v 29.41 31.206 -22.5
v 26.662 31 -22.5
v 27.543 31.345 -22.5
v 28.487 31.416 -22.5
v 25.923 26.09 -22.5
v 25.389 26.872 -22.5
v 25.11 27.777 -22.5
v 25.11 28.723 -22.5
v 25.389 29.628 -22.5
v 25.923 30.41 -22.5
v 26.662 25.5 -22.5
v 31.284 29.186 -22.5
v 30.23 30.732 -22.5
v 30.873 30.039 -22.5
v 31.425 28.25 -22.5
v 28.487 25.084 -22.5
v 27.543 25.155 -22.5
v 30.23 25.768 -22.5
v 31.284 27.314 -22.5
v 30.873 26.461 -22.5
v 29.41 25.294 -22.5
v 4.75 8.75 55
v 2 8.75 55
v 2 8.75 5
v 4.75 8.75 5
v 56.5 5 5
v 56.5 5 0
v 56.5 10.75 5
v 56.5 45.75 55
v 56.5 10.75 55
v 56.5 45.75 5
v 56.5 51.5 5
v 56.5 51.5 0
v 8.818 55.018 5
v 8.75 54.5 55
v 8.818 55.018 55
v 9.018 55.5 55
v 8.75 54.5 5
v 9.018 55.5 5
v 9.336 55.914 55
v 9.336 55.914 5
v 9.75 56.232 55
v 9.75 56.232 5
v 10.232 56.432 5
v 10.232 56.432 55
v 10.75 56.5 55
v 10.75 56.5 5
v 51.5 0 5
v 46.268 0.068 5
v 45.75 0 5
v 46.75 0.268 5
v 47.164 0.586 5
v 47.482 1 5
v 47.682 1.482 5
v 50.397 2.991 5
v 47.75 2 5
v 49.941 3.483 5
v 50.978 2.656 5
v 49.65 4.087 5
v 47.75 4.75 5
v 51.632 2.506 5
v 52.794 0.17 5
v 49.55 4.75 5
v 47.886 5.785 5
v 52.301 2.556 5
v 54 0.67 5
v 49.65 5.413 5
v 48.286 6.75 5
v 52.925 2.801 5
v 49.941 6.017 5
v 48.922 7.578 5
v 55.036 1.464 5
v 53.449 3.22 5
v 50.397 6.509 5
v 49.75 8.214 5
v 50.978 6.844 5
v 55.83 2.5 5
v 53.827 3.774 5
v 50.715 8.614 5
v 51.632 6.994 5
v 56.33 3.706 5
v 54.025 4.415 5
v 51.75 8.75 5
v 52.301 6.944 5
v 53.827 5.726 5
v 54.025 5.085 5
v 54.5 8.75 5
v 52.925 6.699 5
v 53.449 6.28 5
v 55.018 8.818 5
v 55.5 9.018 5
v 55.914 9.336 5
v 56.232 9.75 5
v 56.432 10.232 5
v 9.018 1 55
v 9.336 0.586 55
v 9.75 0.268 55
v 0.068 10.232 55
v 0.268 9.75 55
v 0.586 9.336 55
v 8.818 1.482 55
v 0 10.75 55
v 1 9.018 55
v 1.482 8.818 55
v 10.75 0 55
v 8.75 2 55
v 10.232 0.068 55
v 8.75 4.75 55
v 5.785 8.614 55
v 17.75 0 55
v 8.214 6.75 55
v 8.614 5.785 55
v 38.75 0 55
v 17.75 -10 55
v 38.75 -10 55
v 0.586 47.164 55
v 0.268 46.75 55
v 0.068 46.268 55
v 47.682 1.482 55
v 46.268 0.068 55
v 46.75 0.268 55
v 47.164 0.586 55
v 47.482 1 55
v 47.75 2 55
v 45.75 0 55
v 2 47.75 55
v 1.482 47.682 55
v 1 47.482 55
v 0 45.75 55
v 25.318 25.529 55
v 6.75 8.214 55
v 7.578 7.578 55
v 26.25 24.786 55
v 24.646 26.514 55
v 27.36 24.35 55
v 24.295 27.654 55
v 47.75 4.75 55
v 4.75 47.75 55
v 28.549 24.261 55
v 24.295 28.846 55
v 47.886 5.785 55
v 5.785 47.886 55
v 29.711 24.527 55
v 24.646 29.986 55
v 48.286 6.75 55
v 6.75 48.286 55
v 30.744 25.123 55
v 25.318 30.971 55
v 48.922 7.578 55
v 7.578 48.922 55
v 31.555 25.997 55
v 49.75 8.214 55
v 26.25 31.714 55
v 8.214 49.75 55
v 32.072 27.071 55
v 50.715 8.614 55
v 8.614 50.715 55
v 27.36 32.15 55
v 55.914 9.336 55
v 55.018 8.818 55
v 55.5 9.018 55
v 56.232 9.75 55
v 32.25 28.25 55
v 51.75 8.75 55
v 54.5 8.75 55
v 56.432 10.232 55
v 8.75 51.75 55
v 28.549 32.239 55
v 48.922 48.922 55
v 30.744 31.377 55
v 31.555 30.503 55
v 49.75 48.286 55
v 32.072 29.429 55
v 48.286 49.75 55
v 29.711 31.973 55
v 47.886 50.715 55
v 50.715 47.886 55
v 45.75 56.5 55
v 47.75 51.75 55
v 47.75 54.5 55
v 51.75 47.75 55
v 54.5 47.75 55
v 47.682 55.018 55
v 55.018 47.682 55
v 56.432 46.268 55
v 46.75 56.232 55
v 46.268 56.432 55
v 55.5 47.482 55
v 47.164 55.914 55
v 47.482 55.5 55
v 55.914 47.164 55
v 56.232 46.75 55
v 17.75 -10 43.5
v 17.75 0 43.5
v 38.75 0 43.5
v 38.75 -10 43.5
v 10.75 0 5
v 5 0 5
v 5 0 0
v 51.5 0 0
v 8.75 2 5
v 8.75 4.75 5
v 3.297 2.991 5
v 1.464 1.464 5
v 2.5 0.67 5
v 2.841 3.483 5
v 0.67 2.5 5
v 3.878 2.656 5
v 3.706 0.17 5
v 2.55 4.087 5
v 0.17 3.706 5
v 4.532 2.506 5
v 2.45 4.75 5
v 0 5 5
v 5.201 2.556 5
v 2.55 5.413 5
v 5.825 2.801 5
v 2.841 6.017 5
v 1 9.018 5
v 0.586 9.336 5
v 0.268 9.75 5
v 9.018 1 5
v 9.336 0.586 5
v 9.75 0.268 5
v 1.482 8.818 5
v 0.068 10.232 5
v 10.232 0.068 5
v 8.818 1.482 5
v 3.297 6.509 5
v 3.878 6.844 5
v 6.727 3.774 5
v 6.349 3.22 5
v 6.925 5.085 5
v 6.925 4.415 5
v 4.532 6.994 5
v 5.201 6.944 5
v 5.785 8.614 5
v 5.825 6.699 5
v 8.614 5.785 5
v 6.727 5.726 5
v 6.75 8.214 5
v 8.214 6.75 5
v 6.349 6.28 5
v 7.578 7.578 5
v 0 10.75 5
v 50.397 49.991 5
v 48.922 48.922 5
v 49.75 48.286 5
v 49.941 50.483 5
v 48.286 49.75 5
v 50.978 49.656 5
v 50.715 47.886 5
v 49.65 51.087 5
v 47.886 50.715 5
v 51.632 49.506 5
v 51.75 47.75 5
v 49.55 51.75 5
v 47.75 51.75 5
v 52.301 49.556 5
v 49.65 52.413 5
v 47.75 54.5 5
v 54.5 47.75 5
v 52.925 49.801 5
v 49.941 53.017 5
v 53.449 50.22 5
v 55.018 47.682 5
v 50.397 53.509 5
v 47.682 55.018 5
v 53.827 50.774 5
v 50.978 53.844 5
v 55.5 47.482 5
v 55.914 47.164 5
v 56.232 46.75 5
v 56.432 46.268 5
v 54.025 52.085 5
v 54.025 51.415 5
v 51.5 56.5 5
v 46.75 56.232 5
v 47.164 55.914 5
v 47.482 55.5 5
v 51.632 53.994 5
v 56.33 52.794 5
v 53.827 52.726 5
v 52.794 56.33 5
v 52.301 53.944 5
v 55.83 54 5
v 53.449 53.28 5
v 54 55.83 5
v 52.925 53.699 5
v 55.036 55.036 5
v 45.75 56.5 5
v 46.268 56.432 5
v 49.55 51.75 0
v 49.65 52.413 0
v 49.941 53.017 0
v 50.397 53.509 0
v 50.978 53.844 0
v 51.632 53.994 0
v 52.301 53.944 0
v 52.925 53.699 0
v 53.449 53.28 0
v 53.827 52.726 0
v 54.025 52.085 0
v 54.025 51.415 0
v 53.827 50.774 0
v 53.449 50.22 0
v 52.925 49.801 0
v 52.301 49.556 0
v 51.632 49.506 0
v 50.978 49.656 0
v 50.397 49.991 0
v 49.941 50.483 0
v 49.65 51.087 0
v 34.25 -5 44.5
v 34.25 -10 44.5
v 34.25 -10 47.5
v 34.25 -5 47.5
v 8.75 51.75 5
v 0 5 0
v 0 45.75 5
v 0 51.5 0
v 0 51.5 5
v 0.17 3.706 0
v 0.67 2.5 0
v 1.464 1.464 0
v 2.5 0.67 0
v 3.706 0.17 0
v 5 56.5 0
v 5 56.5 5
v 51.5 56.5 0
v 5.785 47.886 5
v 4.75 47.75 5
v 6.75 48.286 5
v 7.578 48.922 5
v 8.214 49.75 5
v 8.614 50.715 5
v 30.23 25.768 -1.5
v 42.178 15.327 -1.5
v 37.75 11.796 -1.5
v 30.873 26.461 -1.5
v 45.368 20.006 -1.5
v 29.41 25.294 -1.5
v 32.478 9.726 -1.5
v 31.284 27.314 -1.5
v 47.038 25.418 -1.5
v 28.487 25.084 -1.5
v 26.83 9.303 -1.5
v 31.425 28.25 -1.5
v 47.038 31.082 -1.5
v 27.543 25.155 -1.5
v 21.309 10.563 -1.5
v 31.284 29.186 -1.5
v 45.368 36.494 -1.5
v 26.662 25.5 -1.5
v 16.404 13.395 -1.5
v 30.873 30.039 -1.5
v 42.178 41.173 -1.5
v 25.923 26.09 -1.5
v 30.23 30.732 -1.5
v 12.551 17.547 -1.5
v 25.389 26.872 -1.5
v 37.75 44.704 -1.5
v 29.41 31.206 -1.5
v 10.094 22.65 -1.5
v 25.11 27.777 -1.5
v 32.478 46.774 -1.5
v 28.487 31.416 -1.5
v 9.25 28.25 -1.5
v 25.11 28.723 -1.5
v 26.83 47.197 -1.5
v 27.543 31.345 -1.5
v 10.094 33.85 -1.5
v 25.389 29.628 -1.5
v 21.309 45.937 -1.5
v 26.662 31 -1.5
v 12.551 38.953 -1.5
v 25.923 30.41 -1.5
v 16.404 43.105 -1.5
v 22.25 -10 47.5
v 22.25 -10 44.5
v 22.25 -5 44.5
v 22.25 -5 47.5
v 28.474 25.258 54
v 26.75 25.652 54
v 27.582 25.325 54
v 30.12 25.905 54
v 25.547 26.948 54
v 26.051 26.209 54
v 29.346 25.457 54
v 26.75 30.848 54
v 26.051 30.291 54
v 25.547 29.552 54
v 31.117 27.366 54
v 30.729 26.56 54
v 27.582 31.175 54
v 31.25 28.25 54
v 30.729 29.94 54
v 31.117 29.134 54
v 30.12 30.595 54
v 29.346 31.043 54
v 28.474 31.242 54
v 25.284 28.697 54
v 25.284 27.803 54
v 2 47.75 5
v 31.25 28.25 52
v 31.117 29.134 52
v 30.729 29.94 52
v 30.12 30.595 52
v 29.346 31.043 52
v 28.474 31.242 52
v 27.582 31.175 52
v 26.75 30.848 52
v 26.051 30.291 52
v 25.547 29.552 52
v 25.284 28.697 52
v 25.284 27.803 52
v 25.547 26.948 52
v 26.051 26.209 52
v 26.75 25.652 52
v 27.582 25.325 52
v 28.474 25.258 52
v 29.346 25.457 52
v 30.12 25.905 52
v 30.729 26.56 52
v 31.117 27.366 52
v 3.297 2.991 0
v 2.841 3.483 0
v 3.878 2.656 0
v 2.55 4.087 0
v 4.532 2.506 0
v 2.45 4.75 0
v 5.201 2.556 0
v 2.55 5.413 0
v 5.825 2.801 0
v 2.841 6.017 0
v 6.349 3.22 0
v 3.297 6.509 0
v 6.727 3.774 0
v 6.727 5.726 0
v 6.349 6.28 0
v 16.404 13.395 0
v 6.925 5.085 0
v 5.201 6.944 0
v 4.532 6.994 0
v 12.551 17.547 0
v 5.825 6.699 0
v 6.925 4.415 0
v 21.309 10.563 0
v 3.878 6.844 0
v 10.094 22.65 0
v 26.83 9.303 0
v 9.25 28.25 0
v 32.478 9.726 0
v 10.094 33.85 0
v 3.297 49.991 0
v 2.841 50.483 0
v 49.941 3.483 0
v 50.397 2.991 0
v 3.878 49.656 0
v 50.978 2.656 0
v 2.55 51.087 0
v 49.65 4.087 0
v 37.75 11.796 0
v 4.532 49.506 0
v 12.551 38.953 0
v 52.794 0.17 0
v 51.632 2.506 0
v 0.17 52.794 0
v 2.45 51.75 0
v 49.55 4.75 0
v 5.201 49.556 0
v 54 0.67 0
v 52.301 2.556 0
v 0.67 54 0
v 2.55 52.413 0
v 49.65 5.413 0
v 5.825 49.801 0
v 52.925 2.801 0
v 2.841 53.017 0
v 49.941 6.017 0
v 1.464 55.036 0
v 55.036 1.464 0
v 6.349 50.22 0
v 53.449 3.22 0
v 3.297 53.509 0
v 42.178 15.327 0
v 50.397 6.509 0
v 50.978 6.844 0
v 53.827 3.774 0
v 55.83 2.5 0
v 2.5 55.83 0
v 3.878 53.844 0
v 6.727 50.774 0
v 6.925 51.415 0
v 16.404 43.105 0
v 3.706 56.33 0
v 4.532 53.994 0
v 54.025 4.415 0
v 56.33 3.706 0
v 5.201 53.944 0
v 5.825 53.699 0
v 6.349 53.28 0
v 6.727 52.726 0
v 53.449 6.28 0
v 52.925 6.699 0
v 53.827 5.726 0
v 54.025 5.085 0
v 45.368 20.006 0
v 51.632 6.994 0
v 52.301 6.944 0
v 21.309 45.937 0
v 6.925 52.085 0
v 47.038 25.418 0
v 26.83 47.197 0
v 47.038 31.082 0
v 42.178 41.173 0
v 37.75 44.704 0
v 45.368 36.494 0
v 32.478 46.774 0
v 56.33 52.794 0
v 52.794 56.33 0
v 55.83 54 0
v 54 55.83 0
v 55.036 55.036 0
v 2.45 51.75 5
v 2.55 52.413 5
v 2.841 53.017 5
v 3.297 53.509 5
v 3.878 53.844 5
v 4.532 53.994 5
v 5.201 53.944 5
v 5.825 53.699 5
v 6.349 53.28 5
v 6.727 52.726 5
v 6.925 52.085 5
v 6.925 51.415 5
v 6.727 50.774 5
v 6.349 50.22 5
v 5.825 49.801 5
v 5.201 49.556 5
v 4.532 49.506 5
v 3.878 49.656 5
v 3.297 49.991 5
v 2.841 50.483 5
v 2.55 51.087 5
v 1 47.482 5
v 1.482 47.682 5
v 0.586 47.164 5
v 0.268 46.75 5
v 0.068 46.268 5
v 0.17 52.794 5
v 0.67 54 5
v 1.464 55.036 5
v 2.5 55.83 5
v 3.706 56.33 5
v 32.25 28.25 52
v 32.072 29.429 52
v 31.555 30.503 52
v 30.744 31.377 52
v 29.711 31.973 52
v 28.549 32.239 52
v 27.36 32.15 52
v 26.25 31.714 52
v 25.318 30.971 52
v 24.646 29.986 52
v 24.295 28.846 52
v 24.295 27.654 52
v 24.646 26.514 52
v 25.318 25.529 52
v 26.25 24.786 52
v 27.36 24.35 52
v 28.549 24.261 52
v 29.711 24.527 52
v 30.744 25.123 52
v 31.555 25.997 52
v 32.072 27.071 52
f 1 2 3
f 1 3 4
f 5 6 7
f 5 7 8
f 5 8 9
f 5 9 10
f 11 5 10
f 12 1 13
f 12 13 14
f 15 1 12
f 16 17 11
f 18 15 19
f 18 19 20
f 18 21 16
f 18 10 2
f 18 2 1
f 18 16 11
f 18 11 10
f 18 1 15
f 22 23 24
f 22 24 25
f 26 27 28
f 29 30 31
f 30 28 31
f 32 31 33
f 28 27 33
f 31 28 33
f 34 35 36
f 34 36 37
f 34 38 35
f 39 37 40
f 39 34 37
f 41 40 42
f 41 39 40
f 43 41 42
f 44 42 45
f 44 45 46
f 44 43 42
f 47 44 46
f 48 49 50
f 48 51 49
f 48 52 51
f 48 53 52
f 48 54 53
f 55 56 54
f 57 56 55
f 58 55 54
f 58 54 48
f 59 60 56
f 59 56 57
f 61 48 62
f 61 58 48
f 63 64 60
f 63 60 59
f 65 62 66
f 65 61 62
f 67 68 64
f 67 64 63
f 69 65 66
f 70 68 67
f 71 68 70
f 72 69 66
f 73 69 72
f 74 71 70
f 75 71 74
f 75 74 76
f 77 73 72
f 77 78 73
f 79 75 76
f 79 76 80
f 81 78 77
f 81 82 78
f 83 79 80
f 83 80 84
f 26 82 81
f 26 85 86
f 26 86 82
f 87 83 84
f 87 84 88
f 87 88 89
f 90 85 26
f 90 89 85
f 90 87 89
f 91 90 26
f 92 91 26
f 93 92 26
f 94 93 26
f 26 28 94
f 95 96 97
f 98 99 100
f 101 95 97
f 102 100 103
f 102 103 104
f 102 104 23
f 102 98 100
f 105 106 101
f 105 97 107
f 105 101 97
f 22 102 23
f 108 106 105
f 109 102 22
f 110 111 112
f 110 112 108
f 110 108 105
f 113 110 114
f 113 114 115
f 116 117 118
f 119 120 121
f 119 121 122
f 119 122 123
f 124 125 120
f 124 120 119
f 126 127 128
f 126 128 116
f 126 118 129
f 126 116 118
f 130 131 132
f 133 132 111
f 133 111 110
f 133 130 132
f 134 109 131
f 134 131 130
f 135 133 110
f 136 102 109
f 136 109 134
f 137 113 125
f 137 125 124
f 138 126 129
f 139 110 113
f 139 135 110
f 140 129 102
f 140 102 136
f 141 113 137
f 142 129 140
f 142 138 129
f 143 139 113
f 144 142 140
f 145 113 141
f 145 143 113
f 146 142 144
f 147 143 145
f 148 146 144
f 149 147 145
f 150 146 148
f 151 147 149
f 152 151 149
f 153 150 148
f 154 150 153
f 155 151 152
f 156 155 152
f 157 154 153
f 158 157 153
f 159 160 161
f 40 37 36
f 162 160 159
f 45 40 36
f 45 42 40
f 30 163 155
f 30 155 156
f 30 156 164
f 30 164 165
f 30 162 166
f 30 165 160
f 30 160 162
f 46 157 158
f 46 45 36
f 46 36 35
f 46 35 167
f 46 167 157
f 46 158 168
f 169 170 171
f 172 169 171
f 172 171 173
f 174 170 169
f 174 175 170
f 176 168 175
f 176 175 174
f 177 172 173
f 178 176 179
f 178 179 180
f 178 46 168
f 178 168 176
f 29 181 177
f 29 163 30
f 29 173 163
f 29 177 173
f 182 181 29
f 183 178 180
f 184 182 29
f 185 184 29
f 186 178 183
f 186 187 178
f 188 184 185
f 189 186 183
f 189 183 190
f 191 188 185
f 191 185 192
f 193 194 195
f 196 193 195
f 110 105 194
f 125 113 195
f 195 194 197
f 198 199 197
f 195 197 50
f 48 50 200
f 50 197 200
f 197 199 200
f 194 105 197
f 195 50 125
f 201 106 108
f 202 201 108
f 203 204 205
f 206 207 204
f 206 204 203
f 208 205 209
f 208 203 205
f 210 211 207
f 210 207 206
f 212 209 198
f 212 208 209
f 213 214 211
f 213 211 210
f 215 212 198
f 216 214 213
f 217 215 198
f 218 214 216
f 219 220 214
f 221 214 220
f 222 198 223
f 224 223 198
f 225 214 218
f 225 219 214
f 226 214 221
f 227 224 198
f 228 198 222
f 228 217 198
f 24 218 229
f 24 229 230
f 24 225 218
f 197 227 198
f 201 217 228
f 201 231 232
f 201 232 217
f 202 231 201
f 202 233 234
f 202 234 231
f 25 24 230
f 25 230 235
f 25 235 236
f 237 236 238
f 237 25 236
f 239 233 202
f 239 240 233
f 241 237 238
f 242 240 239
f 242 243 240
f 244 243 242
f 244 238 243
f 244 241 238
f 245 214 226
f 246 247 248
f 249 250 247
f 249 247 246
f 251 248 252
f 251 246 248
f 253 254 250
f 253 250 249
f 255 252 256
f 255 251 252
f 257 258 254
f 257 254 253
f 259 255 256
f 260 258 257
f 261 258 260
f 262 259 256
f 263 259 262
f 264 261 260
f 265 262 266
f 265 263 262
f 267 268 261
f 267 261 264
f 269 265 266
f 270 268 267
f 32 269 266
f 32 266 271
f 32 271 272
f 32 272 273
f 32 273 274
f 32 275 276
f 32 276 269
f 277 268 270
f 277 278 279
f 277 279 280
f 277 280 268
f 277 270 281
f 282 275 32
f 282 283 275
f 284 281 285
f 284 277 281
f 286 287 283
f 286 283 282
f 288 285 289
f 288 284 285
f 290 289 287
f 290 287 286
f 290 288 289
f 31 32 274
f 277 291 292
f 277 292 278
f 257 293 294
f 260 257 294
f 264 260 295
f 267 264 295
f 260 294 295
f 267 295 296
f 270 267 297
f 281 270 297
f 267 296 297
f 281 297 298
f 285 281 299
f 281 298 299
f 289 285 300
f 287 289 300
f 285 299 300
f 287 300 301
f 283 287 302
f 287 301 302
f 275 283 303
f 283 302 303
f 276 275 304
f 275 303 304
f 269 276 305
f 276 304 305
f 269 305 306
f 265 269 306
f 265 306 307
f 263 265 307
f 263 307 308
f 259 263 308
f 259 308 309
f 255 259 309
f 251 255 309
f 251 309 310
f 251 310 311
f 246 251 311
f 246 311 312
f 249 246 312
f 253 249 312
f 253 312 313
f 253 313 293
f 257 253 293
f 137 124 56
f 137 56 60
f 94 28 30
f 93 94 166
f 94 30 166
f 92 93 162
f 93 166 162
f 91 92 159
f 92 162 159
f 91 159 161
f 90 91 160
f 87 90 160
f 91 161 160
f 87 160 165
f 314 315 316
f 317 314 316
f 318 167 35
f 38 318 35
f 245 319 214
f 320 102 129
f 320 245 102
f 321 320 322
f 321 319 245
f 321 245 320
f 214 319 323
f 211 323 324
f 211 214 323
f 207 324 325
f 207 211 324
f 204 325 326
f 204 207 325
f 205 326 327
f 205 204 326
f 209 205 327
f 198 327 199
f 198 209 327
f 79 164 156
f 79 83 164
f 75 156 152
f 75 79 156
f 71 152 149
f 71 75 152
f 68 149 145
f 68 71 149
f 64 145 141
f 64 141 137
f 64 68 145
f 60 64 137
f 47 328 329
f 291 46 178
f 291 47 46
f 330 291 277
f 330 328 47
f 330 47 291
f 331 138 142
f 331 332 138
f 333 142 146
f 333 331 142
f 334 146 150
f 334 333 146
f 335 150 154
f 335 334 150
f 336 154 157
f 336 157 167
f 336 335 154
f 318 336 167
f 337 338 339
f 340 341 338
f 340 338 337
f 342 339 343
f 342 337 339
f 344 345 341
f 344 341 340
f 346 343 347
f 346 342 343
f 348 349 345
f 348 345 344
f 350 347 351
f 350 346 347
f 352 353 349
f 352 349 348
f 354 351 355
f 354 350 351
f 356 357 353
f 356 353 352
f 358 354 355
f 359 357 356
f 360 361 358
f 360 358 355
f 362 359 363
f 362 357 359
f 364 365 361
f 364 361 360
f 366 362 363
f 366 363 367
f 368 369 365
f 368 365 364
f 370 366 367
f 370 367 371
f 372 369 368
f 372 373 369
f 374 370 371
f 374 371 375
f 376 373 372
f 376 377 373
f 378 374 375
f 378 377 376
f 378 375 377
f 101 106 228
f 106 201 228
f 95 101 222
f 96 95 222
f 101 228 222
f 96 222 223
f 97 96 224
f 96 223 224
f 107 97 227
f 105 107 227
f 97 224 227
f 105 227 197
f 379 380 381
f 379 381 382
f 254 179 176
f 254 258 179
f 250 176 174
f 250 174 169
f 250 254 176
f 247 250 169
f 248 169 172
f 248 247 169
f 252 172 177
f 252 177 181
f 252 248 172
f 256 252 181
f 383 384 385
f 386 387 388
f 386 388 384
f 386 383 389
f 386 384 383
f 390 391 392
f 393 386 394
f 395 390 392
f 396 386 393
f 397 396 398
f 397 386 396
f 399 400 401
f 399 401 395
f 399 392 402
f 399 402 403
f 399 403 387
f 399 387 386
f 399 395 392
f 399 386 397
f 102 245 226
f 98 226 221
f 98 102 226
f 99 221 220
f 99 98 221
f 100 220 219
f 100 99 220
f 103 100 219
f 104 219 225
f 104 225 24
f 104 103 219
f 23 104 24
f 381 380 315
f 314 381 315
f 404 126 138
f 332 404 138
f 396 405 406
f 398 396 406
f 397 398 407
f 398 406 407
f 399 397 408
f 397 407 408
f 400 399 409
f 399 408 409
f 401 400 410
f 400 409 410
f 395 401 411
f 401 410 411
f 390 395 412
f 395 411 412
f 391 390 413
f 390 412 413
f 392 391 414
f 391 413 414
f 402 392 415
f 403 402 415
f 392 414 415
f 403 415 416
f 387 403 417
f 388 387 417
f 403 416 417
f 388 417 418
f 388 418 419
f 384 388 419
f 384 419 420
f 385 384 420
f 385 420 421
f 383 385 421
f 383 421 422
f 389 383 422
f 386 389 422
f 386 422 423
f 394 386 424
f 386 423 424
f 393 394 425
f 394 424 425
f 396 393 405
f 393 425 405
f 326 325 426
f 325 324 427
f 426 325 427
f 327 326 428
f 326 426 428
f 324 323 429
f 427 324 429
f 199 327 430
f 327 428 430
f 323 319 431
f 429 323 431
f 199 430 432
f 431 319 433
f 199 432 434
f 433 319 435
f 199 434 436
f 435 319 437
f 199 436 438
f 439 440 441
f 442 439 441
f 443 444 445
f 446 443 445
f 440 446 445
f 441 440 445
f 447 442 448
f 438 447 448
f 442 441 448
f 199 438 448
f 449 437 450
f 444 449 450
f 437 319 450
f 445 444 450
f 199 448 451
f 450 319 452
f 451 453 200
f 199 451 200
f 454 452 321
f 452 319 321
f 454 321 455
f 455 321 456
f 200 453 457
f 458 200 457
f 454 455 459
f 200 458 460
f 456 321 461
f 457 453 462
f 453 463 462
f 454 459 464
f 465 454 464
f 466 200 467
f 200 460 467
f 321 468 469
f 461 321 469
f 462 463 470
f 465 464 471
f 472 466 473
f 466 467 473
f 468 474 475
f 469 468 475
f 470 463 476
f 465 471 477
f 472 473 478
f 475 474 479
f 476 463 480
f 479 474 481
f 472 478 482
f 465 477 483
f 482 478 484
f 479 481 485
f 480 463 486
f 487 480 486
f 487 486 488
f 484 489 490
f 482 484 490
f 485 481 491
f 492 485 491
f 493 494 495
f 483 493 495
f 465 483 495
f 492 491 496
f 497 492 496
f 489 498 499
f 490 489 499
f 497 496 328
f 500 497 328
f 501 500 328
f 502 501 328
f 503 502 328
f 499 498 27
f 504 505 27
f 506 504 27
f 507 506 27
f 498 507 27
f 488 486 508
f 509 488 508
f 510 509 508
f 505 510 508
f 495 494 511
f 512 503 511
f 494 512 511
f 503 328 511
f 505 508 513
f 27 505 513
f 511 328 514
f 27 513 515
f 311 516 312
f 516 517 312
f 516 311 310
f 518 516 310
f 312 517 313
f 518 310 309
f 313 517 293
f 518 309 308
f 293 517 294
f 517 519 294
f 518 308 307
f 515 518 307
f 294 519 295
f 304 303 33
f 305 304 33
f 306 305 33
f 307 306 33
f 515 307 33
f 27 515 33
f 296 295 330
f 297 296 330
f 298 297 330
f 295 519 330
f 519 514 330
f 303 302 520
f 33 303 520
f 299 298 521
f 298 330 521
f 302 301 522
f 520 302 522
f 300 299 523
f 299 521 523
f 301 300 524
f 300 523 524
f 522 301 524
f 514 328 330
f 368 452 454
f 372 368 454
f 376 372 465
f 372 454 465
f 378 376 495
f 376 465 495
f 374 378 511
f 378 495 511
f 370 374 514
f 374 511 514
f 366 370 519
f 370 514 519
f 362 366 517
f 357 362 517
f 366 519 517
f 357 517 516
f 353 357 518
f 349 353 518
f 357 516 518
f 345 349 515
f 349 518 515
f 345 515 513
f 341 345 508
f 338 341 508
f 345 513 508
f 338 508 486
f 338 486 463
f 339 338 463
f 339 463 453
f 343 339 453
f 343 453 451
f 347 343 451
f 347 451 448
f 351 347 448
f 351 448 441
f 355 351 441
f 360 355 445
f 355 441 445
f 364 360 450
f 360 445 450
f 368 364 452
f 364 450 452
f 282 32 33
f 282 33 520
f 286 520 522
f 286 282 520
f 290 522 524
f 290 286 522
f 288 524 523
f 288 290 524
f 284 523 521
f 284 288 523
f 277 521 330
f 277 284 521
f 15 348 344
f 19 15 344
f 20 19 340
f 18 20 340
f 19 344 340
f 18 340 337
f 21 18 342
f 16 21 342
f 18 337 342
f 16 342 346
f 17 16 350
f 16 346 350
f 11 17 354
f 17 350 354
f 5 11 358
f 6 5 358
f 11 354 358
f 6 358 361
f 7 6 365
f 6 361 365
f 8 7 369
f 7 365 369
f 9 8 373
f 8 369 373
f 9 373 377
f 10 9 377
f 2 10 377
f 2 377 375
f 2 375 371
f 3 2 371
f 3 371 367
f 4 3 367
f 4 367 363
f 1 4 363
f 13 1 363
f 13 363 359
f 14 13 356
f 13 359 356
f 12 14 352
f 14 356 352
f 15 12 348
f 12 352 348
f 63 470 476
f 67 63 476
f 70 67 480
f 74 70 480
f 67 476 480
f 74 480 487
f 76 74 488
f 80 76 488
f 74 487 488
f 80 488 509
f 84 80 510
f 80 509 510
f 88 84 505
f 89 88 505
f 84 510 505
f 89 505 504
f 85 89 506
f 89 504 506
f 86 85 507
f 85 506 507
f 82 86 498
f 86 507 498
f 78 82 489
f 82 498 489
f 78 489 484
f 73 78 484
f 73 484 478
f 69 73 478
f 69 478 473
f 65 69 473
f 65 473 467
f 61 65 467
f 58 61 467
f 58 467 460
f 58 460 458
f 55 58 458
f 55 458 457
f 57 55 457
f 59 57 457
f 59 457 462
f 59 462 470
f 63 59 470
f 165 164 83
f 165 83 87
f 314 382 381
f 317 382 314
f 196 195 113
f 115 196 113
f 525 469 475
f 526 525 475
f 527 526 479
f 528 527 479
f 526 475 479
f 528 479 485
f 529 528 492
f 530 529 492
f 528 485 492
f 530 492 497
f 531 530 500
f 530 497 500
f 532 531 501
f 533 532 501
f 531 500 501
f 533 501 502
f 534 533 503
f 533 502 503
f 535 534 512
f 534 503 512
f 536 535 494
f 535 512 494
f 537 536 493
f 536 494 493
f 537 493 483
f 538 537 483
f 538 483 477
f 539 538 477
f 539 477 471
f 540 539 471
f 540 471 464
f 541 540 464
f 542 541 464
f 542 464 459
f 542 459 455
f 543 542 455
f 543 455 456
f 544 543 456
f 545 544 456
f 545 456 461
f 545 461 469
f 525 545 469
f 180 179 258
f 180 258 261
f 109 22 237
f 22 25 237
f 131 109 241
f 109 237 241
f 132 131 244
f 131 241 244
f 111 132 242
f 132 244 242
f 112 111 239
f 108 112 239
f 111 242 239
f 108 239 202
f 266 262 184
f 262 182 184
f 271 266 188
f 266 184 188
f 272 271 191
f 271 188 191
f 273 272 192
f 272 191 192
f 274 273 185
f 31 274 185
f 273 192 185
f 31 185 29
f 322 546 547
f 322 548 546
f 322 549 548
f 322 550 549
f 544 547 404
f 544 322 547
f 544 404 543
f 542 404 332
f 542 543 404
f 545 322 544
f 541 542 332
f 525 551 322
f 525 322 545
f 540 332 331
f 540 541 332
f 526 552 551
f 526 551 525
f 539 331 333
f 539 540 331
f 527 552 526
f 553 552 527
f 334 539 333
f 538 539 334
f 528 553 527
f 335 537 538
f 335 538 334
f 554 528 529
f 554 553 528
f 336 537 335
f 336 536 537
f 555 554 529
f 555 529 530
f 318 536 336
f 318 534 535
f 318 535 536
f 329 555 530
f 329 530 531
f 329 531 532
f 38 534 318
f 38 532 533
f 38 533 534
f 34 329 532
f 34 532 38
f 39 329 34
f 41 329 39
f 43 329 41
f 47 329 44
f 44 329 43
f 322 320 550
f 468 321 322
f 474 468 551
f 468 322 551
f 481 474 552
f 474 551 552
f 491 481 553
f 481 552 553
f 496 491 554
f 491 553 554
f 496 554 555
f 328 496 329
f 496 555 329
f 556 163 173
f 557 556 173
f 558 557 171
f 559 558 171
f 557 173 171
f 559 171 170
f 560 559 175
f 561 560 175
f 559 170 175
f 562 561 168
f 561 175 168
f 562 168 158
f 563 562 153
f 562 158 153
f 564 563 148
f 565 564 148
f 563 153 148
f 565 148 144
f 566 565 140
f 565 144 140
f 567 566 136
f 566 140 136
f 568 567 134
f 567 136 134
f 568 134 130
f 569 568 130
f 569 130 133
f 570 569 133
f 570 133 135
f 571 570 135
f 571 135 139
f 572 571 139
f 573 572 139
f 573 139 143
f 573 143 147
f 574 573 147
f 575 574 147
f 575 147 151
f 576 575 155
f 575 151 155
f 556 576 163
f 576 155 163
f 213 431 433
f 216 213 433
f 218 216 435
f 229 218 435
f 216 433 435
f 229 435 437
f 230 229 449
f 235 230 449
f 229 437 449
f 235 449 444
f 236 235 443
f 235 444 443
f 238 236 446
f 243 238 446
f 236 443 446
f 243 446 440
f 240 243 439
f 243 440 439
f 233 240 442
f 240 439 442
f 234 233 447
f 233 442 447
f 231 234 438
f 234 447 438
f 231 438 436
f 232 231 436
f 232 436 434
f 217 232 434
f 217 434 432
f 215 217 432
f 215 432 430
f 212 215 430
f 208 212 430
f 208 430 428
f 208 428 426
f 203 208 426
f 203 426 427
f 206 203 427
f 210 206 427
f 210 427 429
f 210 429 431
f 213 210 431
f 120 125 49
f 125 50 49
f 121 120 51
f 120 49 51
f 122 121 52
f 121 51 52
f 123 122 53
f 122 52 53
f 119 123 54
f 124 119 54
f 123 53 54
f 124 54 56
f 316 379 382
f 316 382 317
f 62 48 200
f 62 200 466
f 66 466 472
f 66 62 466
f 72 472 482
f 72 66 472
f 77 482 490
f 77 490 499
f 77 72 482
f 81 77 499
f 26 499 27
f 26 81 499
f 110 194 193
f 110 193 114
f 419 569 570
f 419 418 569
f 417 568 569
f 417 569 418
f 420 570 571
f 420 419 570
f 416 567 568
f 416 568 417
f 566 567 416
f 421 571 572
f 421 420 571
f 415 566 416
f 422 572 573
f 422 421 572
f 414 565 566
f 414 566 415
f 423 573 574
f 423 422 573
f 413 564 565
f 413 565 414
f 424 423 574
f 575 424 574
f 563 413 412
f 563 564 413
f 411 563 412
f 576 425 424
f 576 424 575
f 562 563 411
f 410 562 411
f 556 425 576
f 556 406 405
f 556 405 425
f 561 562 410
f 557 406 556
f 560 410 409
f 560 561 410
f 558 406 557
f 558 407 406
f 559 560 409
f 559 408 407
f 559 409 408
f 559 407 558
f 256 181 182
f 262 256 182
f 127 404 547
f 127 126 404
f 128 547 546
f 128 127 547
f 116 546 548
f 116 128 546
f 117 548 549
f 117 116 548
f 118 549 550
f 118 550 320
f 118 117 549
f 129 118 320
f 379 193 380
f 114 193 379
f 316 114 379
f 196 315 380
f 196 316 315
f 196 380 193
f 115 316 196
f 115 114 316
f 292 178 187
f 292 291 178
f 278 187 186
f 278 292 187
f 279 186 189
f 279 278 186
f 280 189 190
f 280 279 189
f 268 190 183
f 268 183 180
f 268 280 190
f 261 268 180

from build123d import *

# Parameters (mm, degrees)
SKETCH_1_W          = 56.5
SKETCH_1_H          = 56.5
EXTRUDE_1_DEPTH     = 55
FILLET_1_R          = 5
SKETCH_2_W          = 27.937414654
SKETCH_2_H          = 17.525111135
CUT_EXTRUDE_1_DEPTH = 50
FILLET_2_R          = 4
FILLET_3_R          = 2
SKETCH_3_R          = 19
EXTRUDE_2_DEPTH     = 1.5
SKETCH_4_R          = 4
CUT_EXTRUDE_2_DEPTH = 3
SKETCH_5_R          = 3
EXTRUDE_3_DEPTH     = 2
SKETCH_6_R          = 3.175
EXTRUDE_4_DEPTH     = 21
SKETCH_7_R          = 2.25
CUT_EXTRUDE_3_DEPTH = 21
SKETCH_8_W          = 21
SKETCH_8_H          = 11.5
EXTRUDE_5_DEPTH     = 10
SKETCH_9_W          = 12
SKETCH_9_H          = 3
CUT_EXTRUDE_4_DEPTH = 5


with BuildPart() as part:
    # 草图1 → 凸台-拉伸1 (new body)
    with BuildSketch(Plane.XY):
        with Locations((28.25, 28.25)):
            Rectangle(SKETCH_1_W, SKETCH_1_H)
    extrude(amount=EXTRUDE_1_DEPTH)

    # 圆角1
    fillet_1_edges = [part.edges().sort_by_distance(p)[0] for p in [
        (0, 56.5, 27.5),
        (56.5, 56.5, 27.5),
        (56.5, 0, 27.5),
        (0, 0, 27.5),
    ]]
    fillet(fillet_1_edges, radius=FILLET_1_R)

    # 草图2 → 切除-拉伸1 (cut)
    with BuildSketch(Plane.XY.offset(55)):
        with Locations((-5.218707327, 56.512555568)):
            Rectangle(SKETCH_2_W, SKETCH_2_H)
        with Locations((61.718707327, 56.512555568)):
            Rectangle(SKETCH_2_W, SKETCH_2_H)
        with Locations((61.718707327, -0.012555568)):
            Rectangle(SKETCH_2_W, SKETCH_2_H)
        with Locations((-5.218707327, -0.012555568)):
            Rectangle(SKETCH_2_W, SKETCH_2_H)
    extrude(amount=-CUT_EXTRUDE_1_DEPTH, mode=Mode.SUBTRACT)

    # 圆角2
    fillet_2_edges = [part.edges().sort_by_distance(p)[0] for p in [
        (8.75, 8.75, 30),
        (8.75, 47.75, 30),
        (47.75, 47.75, 30),
        (47.75, 8.75, 30),
    ]]
    fillet(fillet_2_edges, radius=FILLET_2_R)

    # 圆角3
    fillet_3_edges = [part.edges().sort_by_distance(p)[0] for p in [
        (0, 8.75, 30),
        (8.75, 0, 30),
        (8.75, 56.5, 30),
        (0, 47.75, 30),
        (56.5, 47.75, 30),
        (47.75, 56.5, 30),
        (47.75, 0, 30),
        (56.5, 8.75, 30),
    ]]
    fillet(fillet_3_edges, radius=FILLET_3_R)

    # 草图3 → 凸台-拉伸2 (add)
    with BuildSketch(Plane(origin=(0, 0, 0), x_dir=(-1, 0, 0), z_dir=(0, 0, -1))):
        with Locations((-28.25, 28.25)):
            Circle(SKETCH_3_R)
    extrude(amount=EXTRUDE_2_DEPTH)

    # 草图4 → 切除-拉伸2 (cut)
    with BuildSketch(Plane.XY.offset(55)):
        with Locations((28.25, 28.25)):
            Circle(SKETCH_4_R)
    extrude(amount=-CUT_EXTRUDE_2_DEPTH, mode=Mode.SUBTRACT)

    # 草图5 → 凸台-拉伸3 (add)
    with BuildSketch(Plane.XY.offset(52)):
        with Locations((28.25, 28.25)):
            Circle(SKETCH_5_R)
    extrude(amount=EXTRUDE_3_DEPTH)

    # 草图6 → 凸台-拉伸4 (add)
    with BuildSketch(Plane(origin=(0, 0, -1.5), x_dir=(-1, 0, 0), z_dir=(0, 0, -1))):
        with Locations(Location((-28.25, 28.25, 0), (0, 0, 180))):
            Circle(SKETCH_6_R)
    extrude(amount=EXTRUDE_4_DEPTH)

    # 草图7 → 切除-拉伸3 (cut)
    with BuildSketch(Plane(origin=(0, 0, 0), x_dir=(-1, 0, 0), z_dir=(0, 0, -1))):
        with Locations((-51.8, 4.75)):
            Circle(SKETCH_7_R)
        with Locations((-4.7, 4.75)):
            Circle(SKETCH_7_R)
        with Locations((-4.7, 51.75)):
            Circle(SKETCH_7_R)
        with Locations((-51.8, 51.75)):
            Circle(SKETCH_7_R)
    extrude(amount=-CUT_EXTRUDE_3_DEPTH, mode=Mode.SUBTRACT)

    # 草图8 → 凸台-拉伸5 (add)
    with BuildSketch(Plane.XZ):
        with Locations((28.25, 49.25)):
            Rectangle(SKETCH_8_W, SKETCH_8_H)
    extrude(amount=EXTRUDE_5_DEPTH)

    # 草图9 → 切除-拉伸4 (cut)
    with BuildSketch(Plane.XZ.offset(10)):
        with Locations((28.25, 46)):
            Rectangle(SKETCH_9_W, SKETCH_9_H)
    extrude(amount=-CUT_EXTRUDE_4_DEPTH, mode=Mode.SUBTRACT)


solid = part.part
